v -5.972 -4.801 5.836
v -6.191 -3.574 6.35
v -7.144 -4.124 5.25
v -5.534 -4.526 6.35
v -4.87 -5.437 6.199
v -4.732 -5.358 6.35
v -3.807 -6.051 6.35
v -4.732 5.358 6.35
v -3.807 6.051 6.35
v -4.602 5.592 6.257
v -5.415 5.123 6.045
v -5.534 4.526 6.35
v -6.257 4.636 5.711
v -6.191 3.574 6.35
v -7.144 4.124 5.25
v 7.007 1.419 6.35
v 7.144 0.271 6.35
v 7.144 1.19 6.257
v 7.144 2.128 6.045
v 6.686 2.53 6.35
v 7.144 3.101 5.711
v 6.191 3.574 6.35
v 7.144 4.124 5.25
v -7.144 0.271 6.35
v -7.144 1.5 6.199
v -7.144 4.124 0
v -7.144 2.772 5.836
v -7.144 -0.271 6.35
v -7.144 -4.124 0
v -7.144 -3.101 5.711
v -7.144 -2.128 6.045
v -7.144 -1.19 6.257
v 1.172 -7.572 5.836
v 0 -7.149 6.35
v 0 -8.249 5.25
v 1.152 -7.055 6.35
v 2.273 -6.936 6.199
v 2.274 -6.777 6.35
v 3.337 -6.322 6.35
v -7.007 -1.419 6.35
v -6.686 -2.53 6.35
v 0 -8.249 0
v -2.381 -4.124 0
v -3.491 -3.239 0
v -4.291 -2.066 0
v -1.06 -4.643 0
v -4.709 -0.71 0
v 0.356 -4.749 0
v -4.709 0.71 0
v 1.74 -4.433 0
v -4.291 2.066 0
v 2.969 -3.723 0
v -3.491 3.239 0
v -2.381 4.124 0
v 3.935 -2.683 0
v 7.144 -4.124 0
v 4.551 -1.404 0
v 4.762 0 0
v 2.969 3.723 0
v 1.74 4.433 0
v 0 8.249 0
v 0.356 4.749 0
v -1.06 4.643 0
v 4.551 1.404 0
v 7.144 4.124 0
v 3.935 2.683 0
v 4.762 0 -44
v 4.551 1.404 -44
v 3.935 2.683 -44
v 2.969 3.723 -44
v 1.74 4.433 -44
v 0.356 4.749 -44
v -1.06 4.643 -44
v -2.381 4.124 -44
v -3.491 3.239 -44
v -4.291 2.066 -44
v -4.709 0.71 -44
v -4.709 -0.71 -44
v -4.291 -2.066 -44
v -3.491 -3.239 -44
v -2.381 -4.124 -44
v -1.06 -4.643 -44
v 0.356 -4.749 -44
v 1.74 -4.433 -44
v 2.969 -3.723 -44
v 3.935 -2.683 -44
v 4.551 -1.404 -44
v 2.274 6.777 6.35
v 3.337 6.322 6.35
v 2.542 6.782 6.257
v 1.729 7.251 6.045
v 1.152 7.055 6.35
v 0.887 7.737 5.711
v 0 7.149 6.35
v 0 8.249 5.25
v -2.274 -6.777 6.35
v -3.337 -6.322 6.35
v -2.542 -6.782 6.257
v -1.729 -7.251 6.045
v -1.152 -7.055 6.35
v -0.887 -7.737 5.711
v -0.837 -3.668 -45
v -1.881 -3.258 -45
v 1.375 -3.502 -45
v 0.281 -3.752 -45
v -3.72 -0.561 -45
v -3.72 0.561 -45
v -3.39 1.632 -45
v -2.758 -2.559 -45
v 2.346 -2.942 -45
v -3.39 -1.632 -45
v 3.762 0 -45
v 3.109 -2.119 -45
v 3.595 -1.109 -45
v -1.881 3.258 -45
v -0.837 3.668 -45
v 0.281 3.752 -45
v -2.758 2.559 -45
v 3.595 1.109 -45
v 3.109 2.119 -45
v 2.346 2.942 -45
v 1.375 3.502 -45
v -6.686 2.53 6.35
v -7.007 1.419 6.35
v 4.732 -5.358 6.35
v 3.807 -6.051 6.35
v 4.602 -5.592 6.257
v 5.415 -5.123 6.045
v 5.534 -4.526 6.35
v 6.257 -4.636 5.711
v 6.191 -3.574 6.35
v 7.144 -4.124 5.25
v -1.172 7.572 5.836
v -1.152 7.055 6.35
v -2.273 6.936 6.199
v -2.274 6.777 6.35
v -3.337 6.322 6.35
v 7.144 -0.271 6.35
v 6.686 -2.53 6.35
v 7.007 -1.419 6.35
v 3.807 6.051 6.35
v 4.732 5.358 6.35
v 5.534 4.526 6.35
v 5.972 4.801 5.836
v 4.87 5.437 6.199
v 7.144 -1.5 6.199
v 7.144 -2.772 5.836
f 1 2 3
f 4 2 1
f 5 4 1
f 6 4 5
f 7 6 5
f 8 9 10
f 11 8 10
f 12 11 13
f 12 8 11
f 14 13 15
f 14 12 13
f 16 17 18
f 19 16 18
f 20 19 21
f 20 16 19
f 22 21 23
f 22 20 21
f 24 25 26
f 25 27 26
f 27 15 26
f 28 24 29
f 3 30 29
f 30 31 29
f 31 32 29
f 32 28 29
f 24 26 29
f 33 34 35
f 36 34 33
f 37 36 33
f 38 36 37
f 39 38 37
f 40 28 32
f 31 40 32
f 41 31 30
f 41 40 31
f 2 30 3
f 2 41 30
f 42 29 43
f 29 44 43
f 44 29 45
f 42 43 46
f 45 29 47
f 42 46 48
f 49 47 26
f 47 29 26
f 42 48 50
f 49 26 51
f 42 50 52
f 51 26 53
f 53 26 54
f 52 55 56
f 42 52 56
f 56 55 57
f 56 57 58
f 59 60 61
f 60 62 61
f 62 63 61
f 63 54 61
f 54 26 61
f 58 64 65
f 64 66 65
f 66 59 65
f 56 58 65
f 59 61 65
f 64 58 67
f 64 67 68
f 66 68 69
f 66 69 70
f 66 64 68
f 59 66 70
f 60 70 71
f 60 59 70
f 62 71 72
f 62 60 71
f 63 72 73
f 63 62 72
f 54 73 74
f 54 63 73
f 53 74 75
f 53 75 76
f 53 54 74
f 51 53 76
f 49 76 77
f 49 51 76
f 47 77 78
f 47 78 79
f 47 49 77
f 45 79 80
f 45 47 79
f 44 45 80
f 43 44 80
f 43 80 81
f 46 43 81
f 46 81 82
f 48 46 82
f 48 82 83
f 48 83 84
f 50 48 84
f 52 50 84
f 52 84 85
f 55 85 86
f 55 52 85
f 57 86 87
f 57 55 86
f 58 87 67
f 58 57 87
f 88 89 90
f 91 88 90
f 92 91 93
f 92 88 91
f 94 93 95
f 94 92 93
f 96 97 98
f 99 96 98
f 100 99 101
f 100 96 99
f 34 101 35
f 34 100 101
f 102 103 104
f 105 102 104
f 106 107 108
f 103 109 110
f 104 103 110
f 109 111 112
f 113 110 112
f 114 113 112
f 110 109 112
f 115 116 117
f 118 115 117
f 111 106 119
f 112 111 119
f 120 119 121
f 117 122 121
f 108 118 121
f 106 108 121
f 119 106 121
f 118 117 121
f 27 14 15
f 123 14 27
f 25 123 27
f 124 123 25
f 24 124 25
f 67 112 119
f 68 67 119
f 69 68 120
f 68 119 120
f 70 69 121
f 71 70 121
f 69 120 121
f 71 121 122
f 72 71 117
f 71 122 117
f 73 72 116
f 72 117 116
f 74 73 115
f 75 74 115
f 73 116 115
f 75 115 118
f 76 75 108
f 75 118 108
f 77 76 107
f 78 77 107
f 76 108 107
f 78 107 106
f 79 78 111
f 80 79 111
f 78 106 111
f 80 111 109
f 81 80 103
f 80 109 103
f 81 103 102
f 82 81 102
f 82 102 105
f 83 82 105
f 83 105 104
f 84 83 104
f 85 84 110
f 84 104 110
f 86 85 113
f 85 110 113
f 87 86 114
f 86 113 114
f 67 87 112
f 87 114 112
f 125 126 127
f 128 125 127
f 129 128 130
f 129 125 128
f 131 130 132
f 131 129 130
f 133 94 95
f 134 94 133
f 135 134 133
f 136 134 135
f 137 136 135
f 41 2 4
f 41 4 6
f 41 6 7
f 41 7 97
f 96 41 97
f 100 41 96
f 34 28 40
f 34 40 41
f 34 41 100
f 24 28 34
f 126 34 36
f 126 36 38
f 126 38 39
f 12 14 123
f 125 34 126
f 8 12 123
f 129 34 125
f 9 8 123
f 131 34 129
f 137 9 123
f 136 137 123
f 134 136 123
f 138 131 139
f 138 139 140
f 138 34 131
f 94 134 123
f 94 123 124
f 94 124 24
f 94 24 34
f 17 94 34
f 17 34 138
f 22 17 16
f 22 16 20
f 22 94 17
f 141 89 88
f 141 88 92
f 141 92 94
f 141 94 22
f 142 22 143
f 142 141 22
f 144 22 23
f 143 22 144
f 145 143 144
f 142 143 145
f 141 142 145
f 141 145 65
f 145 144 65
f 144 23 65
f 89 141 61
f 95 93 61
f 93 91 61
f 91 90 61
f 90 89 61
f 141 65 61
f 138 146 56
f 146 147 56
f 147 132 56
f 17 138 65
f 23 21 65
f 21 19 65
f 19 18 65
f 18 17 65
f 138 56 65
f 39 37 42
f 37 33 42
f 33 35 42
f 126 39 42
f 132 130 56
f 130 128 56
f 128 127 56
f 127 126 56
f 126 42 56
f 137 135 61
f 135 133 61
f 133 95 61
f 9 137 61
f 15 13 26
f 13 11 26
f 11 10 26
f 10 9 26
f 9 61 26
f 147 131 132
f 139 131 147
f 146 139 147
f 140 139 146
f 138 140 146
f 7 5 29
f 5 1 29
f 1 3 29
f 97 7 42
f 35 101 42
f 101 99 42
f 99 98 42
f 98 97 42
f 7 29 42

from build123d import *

# Parameters (mm, degrees)
F0_R     = 4.7625
F1_DEPTH = 6.35
F2_SIZE  = 1.1
F3_DEPTH = 6.35
F4_DEPTH = 45
F5_SIZE  = 1


# Not quite as in the source:
# - a length typed as a fraction of an inch, garbled in the dataset ("3 / 203.2 mm" for 3/8 in), is restored


with BuildPart() as f1:
    # F0 (on Top) → F1 (new body)
    with BuildSketch(Plane.XY):
        with BuildLine():
            ThreePointArc((0, -8.248891971), (4.1244459855, -7.14375), (7.14375, -4.1244459855))
            Line((7.14375, -4.1244459855), (0, -8.248891971))
        make_face()
        with BuildLine():
            ThreePointArc((8.248891971, 0), (7.9678177931, 2.1349703431), (7.14375, 4.1244459855))
            Line((7.14375, 4.1244459855), (7.14375, -4.1244459855))
            ThreePointArc((7.14375, -4.1244459855), (7.9678177931, -2.1349703431), (8.248891971, 0))
        make_face()
        with BuildLine():
            Line((0, 8.248891971), (7.14375, 4.1244459855))
            ThreePointArc((7.14375, 4.1244459855), (4.1244459855, 7.14375), (0, 8.248891971))
        make_face()
        with BuildLine():
            Line((-7.14375, 4.1244459855), (0, 8.248891971))
            ThreePointArc((0, 8.248891971), (-4.1244459855, 7.14375), (-7.14375, 4.1244459855))
        make_face()
        Polygon((7.14375, -4.1244459855), (7.14375, 4.1244459855), (0, 8.248891971), (-7.14375, 4.1244459855), (-7.14375, -4.1244459855), (0, -8.248891971), align=None)
        Circle(F0_R, mode=Mode.SUBTRACT)
        Circle(F0_R)
        with BuildLine():
            Line((-7.14375, -4.1244459855), (-7.14375, 4.1244459855))
            ThreePointArc((-7.14375, 4.1244459855), (-8.248891971, 0), (-7.14375, -4.1244459855))
        make_face()
        with BuildLine():
            ThreePointArc((-7.14375, -4.1244459855), (-4.1244459855, -7.14375), (0, -8.248891971))
            Line((0, -8.248891971), (-7.14375, -4.1244459855))
        make_face()
    extrude(amount=F1_DEPTH)

    # F2
    f2_edges = [f1.edges().sort_by_distance(p)[0] for p in [
        (7.14375, 4.124446, 6.35),
    ]]
    chamfer(f2_edges, length=F2_SIZE)

    # F0 (on Top) → F3 (intersect)
    with BuildSketch(Plane.XY):
        Polygon((7.14375, -4.1244459855), (7.14375, 4.1244459855), (0, 8.248891971), (-7.14375, 4.1244459855), (-7.14375, -4.1244459855), (0, -8.248891971), align=None)
        Circle(F0_R, mode=Mode.SUBTRACT)
        Circle(F0_R)
    extrude(amount=F3_DEPTH, mode=Mode.INTERSECT)

    # F0 (on Top) → F4 (join)
    with BuildSketch(Plane.XY):
        Circle(F0_R)
    extrude(amount=-F4_DEPTH)

    # F5
    f5_edges = [f1.edges().sort_by_distance(p)[0] for p in [
        (-4.7625, 0, -45),
    ]]
    chamfer(f5_edges, length=F5_SIZE)


solid = f1.part
